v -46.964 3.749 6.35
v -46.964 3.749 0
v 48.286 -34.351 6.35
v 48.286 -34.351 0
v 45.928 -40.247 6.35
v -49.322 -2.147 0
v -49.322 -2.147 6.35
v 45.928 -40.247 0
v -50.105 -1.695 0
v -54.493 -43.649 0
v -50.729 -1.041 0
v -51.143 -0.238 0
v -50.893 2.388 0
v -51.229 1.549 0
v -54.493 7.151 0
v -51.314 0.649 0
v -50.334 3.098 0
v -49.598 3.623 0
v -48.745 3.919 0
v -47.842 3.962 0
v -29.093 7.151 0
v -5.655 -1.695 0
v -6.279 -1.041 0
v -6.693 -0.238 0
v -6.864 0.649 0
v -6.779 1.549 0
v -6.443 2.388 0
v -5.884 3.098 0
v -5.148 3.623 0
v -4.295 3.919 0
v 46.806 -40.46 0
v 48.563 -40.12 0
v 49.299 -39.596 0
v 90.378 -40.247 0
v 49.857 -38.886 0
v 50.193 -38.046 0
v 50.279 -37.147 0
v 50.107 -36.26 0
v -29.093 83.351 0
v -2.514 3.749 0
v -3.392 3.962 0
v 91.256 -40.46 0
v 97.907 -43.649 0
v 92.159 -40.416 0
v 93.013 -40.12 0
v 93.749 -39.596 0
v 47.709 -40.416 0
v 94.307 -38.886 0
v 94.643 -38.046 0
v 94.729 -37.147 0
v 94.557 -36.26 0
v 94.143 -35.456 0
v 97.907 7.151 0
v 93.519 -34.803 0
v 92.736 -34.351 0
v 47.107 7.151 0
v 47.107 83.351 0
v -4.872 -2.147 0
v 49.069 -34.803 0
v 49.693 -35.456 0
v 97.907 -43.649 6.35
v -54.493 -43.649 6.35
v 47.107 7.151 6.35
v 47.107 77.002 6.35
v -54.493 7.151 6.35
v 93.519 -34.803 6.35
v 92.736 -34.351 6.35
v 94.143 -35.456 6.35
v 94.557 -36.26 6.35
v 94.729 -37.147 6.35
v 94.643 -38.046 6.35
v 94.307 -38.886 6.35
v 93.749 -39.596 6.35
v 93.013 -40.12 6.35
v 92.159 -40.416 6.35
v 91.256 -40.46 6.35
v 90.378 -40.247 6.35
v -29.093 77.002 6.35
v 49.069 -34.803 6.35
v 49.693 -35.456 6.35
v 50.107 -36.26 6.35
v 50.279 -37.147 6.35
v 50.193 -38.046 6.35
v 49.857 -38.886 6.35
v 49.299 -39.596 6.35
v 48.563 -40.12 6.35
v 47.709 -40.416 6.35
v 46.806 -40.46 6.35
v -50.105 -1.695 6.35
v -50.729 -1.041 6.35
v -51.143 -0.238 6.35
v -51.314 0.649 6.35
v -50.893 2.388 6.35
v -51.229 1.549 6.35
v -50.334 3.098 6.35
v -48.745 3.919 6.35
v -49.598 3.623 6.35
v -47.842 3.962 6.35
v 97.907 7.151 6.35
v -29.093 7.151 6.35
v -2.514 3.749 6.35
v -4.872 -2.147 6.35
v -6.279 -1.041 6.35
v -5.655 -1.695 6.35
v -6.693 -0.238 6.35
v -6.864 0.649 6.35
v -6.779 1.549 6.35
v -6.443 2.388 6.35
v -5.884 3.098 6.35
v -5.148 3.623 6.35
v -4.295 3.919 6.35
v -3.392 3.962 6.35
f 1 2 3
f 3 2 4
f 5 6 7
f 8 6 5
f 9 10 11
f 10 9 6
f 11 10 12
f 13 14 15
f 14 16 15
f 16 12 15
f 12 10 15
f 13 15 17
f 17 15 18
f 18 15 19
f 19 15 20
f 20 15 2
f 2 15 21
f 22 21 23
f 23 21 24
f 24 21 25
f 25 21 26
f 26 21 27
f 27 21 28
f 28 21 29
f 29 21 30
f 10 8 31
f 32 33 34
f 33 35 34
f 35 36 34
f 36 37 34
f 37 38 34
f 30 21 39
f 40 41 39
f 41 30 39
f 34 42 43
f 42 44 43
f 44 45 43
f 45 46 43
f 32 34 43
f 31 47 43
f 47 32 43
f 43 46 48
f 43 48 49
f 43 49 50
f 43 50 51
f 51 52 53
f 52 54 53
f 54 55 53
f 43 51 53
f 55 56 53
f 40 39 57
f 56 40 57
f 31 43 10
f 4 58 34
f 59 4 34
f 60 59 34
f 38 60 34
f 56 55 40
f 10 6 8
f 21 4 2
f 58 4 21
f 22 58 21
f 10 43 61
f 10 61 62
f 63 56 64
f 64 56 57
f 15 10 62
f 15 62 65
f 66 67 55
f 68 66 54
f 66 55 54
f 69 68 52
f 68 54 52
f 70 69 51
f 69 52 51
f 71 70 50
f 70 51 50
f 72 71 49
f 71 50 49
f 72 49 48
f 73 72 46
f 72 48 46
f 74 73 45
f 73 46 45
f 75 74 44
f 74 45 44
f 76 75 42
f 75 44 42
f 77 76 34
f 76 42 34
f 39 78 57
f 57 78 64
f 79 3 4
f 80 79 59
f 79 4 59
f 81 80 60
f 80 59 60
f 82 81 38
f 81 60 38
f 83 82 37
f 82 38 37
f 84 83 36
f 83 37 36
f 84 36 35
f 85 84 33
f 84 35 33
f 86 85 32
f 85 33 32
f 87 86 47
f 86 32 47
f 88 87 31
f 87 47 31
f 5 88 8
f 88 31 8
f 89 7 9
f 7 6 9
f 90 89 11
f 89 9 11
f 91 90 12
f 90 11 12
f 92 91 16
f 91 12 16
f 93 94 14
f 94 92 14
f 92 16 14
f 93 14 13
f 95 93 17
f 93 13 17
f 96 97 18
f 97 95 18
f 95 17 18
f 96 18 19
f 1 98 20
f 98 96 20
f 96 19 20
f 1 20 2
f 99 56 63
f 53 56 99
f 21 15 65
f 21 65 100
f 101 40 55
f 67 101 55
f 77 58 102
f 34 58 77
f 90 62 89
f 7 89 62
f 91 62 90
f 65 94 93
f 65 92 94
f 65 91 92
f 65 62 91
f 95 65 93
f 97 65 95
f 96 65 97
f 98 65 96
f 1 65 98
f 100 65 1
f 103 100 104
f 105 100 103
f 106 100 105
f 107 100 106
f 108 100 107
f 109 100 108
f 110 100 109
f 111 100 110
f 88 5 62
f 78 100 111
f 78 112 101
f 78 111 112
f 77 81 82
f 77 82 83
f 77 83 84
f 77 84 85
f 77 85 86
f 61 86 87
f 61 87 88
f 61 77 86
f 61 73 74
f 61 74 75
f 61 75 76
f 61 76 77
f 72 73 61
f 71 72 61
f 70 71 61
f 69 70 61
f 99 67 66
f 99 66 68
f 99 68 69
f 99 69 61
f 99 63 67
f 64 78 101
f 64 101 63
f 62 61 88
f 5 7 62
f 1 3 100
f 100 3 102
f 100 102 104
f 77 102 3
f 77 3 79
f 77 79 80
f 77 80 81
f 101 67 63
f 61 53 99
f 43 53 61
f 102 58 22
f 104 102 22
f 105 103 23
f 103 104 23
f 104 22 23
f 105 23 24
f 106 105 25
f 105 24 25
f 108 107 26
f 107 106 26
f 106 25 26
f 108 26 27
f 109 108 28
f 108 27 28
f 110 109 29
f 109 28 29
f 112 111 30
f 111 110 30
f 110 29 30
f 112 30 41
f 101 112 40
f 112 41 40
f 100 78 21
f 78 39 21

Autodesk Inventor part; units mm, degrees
ref_plane "YZ Plane" through (0, 0, 0) normal (1, 0, 0) x (0, 1, 0)
ref_plane "XZ Plane" through (0, 0, 0) normal (0, 1, 0) x (-1, 0, 0)
ref_plane "XY Plane" through (0, 0, 0) normal (0, 0, 1) x (1, 0, 0)
sketch "Sketch1" plane through (0, 0, 0) normal (0, 0, 1) x (1, 0, 0)
  line L0 (-29.0928, 7.1512) -> (47.1072, 7.1512)
  line L1 (47.1072, 7.1512) -> (47.1072, 83.3512)
  line L2 (47.1072, 83.3512) -> (-29.0928, 83.3512)
  line L3 (-29.0928, 83.3512) -> (-29.0928, 7.1512)
  line L4 (-54.4928, 7.1512) -> (97.9072, 7.1512)
  line L5 (97.9072, 7.1512) -> (97.9072, -43.6488)
  line L6 (97.9072, -43.6488) -> (-54.4928, -43.6488)
  line L7 (-54.4928, -43.6488) -> (-54.4928, 7.1512)
  circle A0 centre (-48.1428, 0.8012) radius 3.175
  circle A1 centre (47.1072, -37.2988) radius 3.175
  line L8 (-46.9636, 3.7491) -> (48.2864, -34.3509)
  line L9 (-49.322, -2.1467) -> (45.928, -40.2467)
  circle A2 centre (-3.6928, 0.8012) radius 3.175
  line L10 (-4.872, -2.1467) -> (90.378, -40.2467)
  line L11 (-2.5136, 3.7491) -> (92.7364, -34.3509)
  circle A3 centre (91.5572, -37.2988) radius 3.175
  point P0 (0, 0)
  point P1 (-29.0928, 7.1512)
  dimension "d0" = 76.2
  dimension "d1" = 76.2
  dimension "d2" = 152.4
  dimension "d3" = 50.8
  dimension "d4" = 25.4
  dimension "d5" = 6.35
  dimension "d6" = 6.35
  dimension "d7" = 6.35
  dimension "d8" = 6.35
  dimension "d9" = 6.35
  dimension "d10" = 6.35
  dimension "d11" = 6.35
  dimension "d12" = 6.35
extrude "Extrusion1" add sketch "Sketch1" along normal blind 6.35
chamfer "Chamfer1" distance 6.35 angle 45 1 edges at (9.0072, 83.3512, 6.35)
properties part number "Tall Wall Lift"
